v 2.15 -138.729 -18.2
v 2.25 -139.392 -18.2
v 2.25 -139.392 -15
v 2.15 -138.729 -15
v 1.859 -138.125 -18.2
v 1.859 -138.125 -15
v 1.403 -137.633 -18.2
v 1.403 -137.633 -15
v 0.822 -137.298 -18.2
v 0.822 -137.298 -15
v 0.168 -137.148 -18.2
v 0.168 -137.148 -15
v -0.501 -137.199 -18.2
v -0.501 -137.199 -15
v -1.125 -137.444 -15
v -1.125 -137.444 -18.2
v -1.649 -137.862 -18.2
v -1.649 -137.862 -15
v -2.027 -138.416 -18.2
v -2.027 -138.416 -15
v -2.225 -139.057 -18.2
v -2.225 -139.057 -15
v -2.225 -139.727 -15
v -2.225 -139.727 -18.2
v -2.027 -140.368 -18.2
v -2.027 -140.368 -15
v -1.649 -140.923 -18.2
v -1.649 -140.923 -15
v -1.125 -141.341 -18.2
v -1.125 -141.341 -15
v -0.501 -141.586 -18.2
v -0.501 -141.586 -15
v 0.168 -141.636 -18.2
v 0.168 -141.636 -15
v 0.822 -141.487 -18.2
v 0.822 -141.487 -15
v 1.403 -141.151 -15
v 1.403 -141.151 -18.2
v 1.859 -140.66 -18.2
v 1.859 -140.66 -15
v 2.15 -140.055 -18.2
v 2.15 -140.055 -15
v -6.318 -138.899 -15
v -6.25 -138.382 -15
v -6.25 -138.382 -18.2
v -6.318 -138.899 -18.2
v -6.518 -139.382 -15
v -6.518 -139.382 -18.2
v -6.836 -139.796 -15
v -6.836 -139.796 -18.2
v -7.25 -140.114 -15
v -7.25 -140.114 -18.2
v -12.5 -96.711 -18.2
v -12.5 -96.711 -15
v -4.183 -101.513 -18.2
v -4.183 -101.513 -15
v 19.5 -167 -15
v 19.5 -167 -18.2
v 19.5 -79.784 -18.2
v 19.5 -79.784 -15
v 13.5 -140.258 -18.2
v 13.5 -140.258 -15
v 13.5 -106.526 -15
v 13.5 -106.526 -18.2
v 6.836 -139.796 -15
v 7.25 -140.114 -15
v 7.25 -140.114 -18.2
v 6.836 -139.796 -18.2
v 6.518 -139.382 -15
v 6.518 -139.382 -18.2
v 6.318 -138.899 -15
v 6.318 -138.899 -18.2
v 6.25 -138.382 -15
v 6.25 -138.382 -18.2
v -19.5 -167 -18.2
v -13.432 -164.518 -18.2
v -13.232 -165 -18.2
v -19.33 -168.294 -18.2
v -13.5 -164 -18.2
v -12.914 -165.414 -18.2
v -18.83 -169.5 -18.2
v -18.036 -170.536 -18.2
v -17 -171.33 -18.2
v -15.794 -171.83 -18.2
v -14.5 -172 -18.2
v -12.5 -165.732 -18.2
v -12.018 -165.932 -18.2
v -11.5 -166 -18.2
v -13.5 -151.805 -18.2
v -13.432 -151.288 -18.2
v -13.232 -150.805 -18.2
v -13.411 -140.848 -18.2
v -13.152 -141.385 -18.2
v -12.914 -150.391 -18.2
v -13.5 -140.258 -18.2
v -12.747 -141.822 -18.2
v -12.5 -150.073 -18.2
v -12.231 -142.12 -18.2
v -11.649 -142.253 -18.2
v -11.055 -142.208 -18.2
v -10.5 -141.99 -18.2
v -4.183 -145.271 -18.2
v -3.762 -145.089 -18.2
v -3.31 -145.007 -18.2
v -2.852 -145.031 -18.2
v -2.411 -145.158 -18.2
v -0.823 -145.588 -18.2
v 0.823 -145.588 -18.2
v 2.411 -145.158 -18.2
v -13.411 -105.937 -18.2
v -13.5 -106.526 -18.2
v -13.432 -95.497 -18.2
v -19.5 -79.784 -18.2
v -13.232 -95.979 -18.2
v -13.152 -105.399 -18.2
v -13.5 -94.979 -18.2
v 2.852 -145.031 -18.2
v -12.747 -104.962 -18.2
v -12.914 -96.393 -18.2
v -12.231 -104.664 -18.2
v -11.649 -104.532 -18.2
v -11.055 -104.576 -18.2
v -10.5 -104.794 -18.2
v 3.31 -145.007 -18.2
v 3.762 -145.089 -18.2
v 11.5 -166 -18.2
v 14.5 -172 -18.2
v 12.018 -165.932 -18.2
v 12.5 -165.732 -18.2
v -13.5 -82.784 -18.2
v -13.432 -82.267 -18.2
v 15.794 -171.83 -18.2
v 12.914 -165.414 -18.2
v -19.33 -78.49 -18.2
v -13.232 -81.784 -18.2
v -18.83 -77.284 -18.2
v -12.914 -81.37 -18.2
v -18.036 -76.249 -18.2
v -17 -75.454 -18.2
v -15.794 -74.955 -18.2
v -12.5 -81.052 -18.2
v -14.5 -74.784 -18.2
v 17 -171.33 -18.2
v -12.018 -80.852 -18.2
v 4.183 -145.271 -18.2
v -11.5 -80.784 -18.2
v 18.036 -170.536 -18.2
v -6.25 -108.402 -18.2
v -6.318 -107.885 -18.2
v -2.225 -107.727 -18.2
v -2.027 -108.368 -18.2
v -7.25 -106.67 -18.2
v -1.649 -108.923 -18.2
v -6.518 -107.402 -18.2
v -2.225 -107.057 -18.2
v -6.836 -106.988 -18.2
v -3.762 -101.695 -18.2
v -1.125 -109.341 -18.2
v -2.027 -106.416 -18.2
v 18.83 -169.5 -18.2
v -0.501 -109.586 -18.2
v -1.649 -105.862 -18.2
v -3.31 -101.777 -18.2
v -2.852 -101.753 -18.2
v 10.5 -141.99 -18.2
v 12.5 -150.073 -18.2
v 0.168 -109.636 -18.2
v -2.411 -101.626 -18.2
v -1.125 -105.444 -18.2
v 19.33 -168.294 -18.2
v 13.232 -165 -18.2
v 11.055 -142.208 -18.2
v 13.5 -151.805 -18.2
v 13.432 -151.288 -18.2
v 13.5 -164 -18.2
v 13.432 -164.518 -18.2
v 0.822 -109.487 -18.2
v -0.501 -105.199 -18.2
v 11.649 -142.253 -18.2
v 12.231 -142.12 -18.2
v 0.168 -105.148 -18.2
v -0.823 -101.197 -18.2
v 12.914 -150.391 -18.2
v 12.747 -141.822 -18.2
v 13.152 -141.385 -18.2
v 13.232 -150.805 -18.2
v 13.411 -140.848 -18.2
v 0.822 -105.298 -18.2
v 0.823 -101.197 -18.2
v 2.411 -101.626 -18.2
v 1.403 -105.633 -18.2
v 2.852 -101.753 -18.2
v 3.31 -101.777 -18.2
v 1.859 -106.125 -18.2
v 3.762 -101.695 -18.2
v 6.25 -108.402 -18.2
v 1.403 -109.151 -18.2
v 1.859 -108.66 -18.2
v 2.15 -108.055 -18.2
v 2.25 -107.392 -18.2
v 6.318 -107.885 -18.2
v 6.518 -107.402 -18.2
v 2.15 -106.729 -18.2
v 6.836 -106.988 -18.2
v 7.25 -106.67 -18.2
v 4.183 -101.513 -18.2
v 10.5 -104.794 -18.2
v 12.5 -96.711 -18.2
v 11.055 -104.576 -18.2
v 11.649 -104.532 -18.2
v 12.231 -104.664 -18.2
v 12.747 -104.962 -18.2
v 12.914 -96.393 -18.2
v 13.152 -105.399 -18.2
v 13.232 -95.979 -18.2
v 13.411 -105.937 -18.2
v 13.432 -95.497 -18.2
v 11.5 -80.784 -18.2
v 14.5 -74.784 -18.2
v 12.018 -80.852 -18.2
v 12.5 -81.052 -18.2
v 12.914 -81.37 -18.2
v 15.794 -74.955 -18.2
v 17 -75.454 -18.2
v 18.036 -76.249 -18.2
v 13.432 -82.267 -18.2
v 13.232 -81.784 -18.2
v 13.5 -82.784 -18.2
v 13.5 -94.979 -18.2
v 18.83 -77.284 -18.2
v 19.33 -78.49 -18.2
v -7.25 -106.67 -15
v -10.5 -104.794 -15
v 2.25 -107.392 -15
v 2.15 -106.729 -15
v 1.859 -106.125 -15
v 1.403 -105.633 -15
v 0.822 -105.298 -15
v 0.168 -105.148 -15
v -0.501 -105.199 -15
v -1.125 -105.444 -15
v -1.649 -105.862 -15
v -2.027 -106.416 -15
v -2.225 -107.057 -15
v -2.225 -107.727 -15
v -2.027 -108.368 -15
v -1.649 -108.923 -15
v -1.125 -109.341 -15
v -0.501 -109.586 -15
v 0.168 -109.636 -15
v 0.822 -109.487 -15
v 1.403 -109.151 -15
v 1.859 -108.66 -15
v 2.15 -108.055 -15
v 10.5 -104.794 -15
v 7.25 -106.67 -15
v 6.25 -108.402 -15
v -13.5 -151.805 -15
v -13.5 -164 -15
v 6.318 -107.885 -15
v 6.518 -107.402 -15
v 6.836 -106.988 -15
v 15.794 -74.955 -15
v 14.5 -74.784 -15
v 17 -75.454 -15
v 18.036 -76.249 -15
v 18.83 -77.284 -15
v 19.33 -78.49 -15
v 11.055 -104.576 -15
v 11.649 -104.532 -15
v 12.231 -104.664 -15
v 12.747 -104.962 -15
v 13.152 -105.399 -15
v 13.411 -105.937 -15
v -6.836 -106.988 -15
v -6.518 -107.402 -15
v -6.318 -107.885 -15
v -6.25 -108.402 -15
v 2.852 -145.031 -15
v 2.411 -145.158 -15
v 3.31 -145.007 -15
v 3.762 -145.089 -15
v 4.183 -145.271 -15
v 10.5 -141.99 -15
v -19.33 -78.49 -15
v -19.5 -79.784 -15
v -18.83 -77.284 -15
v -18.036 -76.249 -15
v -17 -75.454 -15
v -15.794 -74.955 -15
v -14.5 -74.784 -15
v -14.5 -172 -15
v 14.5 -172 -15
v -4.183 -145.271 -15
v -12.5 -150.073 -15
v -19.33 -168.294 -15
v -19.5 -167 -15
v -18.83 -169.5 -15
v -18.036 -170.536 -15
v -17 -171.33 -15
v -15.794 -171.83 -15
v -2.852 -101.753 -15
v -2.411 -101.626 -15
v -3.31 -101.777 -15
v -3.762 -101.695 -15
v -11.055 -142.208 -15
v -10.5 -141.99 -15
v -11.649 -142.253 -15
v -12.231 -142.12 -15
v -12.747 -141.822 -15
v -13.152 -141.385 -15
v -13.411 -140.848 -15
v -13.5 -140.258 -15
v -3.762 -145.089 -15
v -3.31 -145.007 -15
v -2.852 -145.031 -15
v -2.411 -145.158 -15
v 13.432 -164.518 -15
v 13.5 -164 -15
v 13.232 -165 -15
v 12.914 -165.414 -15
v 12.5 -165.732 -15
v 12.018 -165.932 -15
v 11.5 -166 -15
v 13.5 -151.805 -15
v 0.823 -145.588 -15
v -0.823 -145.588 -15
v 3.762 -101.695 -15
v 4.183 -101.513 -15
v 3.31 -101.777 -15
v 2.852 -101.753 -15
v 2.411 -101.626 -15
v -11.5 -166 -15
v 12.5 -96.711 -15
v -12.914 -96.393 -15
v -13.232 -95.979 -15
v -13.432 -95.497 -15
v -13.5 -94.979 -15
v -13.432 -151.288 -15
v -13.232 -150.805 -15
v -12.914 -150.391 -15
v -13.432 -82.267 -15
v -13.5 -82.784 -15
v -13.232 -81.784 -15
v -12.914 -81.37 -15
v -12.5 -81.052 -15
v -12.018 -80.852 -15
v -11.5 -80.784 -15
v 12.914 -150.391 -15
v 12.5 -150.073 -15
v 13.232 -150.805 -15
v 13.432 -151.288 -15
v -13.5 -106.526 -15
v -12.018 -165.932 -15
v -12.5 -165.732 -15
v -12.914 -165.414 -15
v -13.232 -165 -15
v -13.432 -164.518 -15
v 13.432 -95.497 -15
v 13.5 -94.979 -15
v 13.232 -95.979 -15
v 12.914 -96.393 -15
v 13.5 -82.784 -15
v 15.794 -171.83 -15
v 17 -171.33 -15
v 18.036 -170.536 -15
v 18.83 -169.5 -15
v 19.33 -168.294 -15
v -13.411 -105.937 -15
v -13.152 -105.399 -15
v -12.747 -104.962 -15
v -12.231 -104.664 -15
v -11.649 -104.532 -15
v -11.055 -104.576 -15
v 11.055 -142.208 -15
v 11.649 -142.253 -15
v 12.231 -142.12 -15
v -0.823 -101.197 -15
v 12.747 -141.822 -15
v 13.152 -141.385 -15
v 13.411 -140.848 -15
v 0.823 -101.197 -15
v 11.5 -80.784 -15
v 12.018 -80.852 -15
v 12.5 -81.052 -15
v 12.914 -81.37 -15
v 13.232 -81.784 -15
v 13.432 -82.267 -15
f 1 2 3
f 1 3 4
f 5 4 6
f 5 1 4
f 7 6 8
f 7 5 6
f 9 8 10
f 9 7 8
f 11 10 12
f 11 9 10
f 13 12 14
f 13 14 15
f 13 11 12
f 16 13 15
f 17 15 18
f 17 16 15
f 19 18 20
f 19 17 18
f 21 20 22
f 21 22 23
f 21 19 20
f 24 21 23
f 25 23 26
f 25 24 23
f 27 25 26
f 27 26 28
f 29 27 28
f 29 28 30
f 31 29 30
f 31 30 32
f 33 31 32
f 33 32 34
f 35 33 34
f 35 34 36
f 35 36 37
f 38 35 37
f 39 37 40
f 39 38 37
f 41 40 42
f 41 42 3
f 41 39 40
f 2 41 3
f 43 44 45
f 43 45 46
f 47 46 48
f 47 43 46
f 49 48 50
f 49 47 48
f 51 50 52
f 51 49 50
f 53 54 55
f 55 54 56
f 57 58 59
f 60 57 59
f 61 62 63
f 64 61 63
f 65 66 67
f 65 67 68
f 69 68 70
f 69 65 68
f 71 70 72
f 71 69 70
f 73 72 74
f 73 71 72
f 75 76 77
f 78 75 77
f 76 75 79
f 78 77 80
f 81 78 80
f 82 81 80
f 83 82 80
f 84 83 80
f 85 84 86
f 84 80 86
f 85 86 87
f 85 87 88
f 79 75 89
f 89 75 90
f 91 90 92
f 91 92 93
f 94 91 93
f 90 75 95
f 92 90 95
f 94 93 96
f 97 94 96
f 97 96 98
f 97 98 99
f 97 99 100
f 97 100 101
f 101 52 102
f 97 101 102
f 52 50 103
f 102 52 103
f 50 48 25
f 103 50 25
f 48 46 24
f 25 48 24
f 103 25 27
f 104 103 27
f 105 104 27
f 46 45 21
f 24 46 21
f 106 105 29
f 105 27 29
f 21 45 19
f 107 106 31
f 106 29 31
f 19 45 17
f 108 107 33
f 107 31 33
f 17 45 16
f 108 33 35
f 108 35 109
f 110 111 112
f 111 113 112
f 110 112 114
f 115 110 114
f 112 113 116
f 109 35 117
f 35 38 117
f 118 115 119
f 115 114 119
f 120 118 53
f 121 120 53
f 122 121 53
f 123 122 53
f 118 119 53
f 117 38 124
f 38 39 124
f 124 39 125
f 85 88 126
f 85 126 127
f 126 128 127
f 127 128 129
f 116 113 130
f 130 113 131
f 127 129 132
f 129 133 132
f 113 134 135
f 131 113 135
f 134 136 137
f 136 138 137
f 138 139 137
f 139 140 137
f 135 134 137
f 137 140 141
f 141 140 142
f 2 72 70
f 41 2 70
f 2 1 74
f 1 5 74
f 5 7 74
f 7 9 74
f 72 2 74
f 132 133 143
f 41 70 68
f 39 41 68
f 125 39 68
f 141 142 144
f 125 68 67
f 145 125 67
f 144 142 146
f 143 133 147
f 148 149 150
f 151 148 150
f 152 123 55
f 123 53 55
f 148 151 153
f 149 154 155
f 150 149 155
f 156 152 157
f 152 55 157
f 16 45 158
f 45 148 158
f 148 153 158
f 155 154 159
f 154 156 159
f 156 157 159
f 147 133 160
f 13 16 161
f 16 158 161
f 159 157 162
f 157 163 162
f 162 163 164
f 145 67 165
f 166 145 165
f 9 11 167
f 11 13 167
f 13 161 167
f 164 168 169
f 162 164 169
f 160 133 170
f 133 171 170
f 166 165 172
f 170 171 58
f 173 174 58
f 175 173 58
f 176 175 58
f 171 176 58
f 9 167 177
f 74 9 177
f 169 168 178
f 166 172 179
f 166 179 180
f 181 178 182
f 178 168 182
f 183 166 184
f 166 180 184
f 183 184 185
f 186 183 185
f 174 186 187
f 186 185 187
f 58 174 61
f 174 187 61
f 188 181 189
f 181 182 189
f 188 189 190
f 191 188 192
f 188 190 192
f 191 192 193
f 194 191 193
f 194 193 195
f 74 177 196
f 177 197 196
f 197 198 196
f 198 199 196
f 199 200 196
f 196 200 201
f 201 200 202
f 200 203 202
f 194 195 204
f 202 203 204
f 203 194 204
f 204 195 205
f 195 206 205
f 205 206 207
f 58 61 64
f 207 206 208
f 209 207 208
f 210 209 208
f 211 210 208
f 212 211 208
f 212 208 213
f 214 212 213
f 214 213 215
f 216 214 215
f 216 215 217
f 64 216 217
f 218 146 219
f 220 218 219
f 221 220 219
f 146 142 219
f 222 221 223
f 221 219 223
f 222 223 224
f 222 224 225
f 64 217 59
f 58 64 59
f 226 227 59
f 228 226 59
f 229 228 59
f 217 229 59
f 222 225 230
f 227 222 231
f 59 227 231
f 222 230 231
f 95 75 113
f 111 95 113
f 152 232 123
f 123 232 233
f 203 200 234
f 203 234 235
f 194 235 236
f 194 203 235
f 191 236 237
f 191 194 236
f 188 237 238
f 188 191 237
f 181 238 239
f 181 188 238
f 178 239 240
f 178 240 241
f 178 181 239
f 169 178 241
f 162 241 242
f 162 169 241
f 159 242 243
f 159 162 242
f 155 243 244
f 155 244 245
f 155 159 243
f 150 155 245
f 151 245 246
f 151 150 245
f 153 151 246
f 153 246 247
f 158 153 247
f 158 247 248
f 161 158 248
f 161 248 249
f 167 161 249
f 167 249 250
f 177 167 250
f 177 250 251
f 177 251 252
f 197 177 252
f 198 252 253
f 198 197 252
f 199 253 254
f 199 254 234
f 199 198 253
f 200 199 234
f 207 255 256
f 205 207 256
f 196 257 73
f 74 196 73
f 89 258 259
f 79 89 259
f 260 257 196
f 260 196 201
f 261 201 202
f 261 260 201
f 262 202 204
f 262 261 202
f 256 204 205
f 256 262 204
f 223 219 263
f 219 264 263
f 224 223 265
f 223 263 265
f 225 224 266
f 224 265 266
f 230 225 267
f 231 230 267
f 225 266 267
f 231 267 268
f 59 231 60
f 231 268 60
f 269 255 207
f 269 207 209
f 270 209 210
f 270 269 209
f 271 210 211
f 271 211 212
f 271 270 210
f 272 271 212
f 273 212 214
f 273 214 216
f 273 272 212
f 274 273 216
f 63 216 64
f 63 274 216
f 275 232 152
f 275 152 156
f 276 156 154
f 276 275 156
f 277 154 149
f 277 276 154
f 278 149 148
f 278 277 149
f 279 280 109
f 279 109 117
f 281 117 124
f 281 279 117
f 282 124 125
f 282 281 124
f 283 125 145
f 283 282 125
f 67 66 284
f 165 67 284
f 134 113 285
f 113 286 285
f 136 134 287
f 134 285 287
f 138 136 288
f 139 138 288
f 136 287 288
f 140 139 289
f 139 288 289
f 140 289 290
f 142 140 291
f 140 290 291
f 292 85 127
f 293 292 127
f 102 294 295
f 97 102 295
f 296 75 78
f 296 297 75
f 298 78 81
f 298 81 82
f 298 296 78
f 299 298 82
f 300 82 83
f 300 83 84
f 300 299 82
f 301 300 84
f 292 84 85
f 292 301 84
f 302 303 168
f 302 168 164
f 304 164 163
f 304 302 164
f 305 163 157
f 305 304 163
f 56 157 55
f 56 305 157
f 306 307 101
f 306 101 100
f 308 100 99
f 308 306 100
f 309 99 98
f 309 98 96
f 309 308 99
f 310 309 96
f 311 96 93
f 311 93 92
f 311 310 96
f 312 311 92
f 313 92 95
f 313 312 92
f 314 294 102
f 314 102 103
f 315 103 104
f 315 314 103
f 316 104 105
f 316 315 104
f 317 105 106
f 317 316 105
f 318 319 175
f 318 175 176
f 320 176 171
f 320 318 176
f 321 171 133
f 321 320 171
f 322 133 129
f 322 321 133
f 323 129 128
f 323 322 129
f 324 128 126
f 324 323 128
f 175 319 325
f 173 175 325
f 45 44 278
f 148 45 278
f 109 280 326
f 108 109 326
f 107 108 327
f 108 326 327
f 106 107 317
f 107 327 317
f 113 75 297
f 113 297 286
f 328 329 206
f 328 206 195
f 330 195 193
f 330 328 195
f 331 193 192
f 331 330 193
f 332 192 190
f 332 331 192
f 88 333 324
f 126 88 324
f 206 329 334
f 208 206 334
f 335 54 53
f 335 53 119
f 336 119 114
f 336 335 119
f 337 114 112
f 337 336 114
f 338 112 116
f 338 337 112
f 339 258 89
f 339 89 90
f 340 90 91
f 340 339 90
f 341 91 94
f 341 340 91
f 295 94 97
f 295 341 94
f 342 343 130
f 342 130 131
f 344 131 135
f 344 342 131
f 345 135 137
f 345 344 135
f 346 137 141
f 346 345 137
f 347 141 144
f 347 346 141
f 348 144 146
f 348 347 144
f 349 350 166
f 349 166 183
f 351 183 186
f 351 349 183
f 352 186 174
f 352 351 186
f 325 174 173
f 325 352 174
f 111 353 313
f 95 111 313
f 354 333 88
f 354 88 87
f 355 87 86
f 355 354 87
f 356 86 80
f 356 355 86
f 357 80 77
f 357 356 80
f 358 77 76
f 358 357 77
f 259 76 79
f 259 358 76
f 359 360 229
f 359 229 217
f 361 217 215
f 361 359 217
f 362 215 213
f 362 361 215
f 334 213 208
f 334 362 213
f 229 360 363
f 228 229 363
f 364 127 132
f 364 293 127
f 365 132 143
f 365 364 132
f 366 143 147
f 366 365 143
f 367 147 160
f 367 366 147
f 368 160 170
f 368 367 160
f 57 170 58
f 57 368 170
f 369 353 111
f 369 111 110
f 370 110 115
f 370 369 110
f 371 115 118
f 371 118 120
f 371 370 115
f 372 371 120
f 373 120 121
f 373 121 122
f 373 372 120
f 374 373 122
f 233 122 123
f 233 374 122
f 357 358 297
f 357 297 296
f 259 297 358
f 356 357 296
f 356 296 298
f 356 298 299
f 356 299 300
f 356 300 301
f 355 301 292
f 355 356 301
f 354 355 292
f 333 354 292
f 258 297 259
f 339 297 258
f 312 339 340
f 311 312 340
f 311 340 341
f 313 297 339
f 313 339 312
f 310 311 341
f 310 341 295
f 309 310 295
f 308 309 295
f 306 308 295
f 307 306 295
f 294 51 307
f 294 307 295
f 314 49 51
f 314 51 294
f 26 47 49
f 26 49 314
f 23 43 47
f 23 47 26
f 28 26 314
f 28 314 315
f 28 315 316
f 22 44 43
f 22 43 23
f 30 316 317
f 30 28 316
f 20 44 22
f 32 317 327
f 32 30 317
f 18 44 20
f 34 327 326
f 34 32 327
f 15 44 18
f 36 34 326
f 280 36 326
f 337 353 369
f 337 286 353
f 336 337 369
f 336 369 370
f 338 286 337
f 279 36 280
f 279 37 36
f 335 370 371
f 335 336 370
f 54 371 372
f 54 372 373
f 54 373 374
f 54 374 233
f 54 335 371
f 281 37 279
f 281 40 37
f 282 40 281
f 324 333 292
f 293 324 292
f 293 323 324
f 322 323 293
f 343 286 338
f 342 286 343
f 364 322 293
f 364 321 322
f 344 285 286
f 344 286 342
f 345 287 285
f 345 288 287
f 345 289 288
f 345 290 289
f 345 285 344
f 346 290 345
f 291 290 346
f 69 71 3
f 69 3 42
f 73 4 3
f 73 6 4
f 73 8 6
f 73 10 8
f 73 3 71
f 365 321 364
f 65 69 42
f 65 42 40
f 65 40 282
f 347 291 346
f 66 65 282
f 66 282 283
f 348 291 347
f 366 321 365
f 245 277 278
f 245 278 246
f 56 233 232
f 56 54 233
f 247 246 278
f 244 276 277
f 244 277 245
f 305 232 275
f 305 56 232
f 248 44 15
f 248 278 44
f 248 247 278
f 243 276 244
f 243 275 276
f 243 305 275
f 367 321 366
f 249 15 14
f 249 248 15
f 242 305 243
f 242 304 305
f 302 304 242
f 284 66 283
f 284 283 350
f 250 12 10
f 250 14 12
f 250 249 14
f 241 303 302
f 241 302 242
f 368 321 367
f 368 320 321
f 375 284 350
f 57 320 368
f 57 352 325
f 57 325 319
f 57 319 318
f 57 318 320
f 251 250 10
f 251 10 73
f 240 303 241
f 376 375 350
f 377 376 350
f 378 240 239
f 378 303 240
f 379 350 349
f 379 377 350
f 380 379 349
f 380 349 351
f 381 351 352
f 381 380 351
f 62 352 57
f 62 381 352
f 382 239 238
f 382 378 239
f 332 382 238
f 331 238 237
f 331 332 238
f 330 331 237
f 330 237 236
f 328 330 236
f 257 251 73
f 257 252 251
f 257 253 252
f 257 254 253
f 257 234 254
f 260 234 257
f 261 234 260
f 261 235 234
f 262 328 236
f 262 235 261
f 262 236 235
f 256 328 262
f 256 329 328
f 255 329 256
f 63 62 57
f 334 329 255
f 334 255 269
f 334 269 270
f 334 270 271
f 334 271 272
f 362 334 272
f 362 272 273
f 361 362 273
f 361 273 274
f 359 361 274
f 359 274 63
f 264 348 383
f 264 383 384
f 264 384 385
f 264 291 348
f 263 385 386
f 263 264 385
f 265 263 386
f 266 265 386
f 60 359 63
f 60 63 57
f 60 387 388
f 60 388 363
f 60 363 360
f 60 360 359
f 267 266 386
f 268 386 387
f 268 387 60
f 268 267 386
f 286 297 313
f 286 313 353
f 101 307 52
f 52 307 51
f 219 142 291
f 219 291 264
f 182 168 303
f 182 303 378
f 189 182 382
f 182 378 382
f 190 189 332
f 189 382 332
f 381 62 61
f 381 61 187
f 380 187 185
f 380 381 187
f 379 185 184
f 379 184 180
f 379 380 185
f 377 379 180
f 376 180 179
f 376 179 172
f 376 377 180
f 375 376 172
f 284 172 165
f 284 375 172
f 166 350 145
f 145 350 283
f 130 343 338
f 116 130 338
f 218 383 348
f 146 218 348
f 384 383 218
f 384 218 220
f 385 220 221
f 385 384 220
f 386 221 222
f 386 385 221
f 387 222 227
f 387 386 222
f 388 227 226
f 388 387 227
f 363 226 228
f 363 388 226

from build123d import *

# Parameters (mm, degrees)
STOCK_SPINE_MASTER_1_START     = -18.2
STOCK_SPINE_MASTER_1_OUTLINE_W = 39
STOCK_SPINE_MASTER_1_OUTLINE_H = 97.215728753
STOCK_SPINE_MASTER_1_OUTLINE_R = 2.25
STOCK_SPINE_MASTER_1_DEPTH     = 3.2
FILLET2_R                      = 5
CUT_EXTRUDE1_DEPTH             = 174.131424069
FILLET5_R                      = 2


# Read off the part's stored shape, not the designer's step: Stock-spine_master-1
with BuildPart() as part:
    # Stock-spine_master-1 outline → Stock-spine_master-1 (new body)
    with BuildSketch(Plane.XY.offset(STOCK_SPINE_MASTER_1_START)):
        with Locations((0, -123.392135623)):
            Rectangle(STOCK_SPINE_MASTER_1_OUTLINE_W, STOCK_SPINE_MASTER_1_OUTLINE_H)
        with Locations((0, -139.392135624)):
            Circle(STOCK_SPINE_MASTER_1_OUTLINE_R, mode=Mode.SUBTRACT)
        with Locations((0, -107.392135624)):
            Circle(STOCK_SPINE_MASTER_1_OUTLINE_R, mode=Mode.SUBTRACT)
    extrude(amount=STOCK_SPINE_MASTER_1_DEPTH)

    # Fillet2
    fillet2_edges = [part.edges().sort_by_distance(p)[0] for p in [
        (19.5, -172, -16.6),
        (19.5, -74.784271247, -16.6),
        (-19.5, -74.784271247, -16.6),
        (-19.5, -172, -16.6),
    ]]
    fillet(fillet2_edges, radius=FILLET2_R)

    # Sketch1 → Cut-Extrude1 (cut, through all)
    with BuildSketch(Plane.XY.offset(-15)):
        with BuildLine():
            Line((-6.248354978, -107.24874781), (-13.5, -103.062008605))
            Line((-13.5, -103.062008605), (-13.5, -143.722262643))
            Line((-13.5, -143.722262643), (-6.248354978, -139.535523437))
            ThreePointArc((-6.248354978, -139.535523437), (-6.249588731, -139.463834249), (-6.25, -139.392135624))
            Line((-6.25, -139.392135624), (-6.25, -107.392135624))
            ThreePointArc((-6.25, -107.392135624), (-6.249588731, -107.320436999), (-6.248354978, -107.24874781))
        make_face()
        with BuildLine():
            Line((13.5, -80.784271247), (-13.5, -80.784271247))
            Line((-13.5, -80.784271247), (-13.5, -96.133805375))
            Line((-13.5, -96.133805375), (-3.248354978, -102.052595387))
            ThreePointArc((-3.248354978, -102.052595387), (0, -101.142135624), (3.248354978, -102.052595387))
            Line((3.248354978, -102.052595387), (13.5, -96.133805375))
            Line((13.5, -96.133805375), (13.5, -80.784271247))
        make_face()
        with BuildLine():
            Line((13.5, -143.722262643), (13.5, -103.062008605))
            Line((13.5, -103.062008605), (6.248354978, -107.24874781))
            ThreePointArc((6.248354978, -107.24874781), (6.249588731, -107.320436999), (6.25, -107.392135624))
            Line((6.25, -107.392135624), (6.25, -139.392135624))
            ThreePointArc((6.25, -139.392135624), (6.249588731, -139.463834249), (6.248354978, -139.535523437))
            Line((6.248354978, -139.535523437), (13.5, -143.722262643))
        make_face()
        with BuildLine():
            Line((-3.248354978, -144.73167586), (-13.5, -150.650465873))
            Line((-13.5, -150.650465873), (-13.5, -166))
            Line((-13.5, -166), (13.5, -166))
            Line((13.5, -166), (13.5, -150.650465873))
            Line((13.5, -150.650465873), (3.248354978, -144.73167586))
            ThreePointArc((3.248354978, -144.73167586), (0, -145.642135624), (-3.248354978, -144.73167586))
        make_face()
    extrude(amount=-CUT_EXTRUDE1_DEPTH, mode=Mode.SUBTRACT)

    # Fillet5
    # the kernel refuses this fillet: 2 mm, written as the material it adds along each edge
    with BuildSketch(Plane(origin=(-6.248354978, -107.24874781, -15), x_dir=(-0.8660254037844632, 0.4999999999999575, 0), z_dir=(0, 0, -1)), Plane(origin=(6.248354978, -139.535523437, -15), x_dir=(0.8660254037844526, -0.4999999999999759, 0), z_dir=(0, 0, -1))) as fillet5_piece_1:
        with BuildLine():
            CenterArc((1.156600046, -2), FILLET5_R, 90, 60)
            Line((-0.575450762, -1), (-0.748655843, -0.9))
            ThreePointArc((-0.748655843, -0.9), (-0.243474357, -0.025), (-0.175453698, 0.096))
            Line((-0.175453698, 0.096), (0, 0.2))
            Line((0, 0.2), (1.156600046, 0.2))
            Line((1.156600046, 0.2), (1.156600046, 0))
        make_face()
    extrude(amount=3.2)
    with BuildSketch(Plane(origin=(6.248354978, -107.24874781, -15), x_dir=(0.8660254037844632, 0.4999999999999575, 0), z_dir=(0, 0, -1)), Plane(origin=(-6.248354978, -139.535523437, -15), x_dir=(-0.8660254037844523, -0.4999999999999766, 0), z_dir=(0, 0, -1))) as fillet5_piece_2:
        with BuildLine():
            CenterArc((1.156600046, 2), FILLET5_R, 210, 60)
            Line((-0.575450762, 1), (-0.748655843, 0.9))
            ThreePointArc((-0.748655843, 0.9), (-0.243474357, 0.025), (-0.175453698, -0.096))
            Line((-0.175453698, -0.096), (0, -0.2))
            Line((0, -0.2), (1.156600046, -0.2))
            Line((1.156600046, -0.2), (1.156600046, 0))
        make_face()
    extrude(amount=3.2)
    with BuildSketch(Plane(origin=(-13.5, -166, -15), x_dir=(0, 1, 0), z_dir=(0, 0, -1)), Plane(origin=(13.5, -166, -15), x_dir=(-1, 0, 0), z_dir=(0, 0, -1)), Plane(origin=(-13.5, -80.784271247, -15), x_dir=(1, 0, 0), z_dir=(0, 0, -1))) as fillet5_piece_3:
        with BuildLine():
            CenterArc((FILLET5_R, FILLET5_R), FILLET5_R, 180, 90)
            Line((0, FILLET5_R), (0, 0))
            Line((0, 0), (FILLET5_R, 0))
        make_face()
    extrude(amount=3.2)
    with BuildSketch(Plane(origin=(13.5, -150.650465873, -15), x_dir=(0, -1, 0), z_dir=(0, 0, -1)), Plane(origin=(13.5, -96.133805375, -15), x_dir=(-0.8660254037844395, -0.49999999999999867, 0), z_dir=(0, 0, -1)), Plane(origin=(-13.5, -96.133805375, -15), x_dir=(0, 1, 0), z_dir=(0, 0, -1)), Plane(origin=(-13.5, -150.650465873, -15), x_dir=(0.8660254037844375, 0.5000000000000019, 0), z_dir=(0, 0, -1))) as fillet5_piece_4:
        with BuildLine():
            CenterArc((FILLET5_R * 0.57735026919, FILLET5_R), FILLET5_R, 210, 60)
            Line((-FILLET5_R * 0.288675134595, FILLET5_R * 0.5), (0, 0))
            Line((0, 0), (FILLET5_R * 0.57735026919, 0))
        make_face()
    extrude(amount=3.2)
    with BuildSketch(Plane(origin=(13.5, -143.722262643, -15), x_dir=(-0.8660254037844394, 0.4999999999999986, 0), z_dir=(0, 0, -1)), Plane(origin=(13.5, -103.062008605, -15), x_dir=(0, -1, 0), z_dir=(0, 0, -1)), Plane(origin=(-13.5, -103.062008605, -15), x_dir=(0.866025403784438, -0.500000000000001, 0), z_dir=(0, 0, -1)), Plane(origin=(-13.5, -143.722262643, -15), x_dir=(0, 1, 0), z_dir=(0, 0, -1))) as fillet5_piece_5:
        with BuildLine():
            CenterArc((FILLET5_R * 1.73205080757, FILLET5_R), FILLET5_R, 150, 120)
            Line((FILLET5_R * 0.866025403784, FILLET5_R * 1.5), (0, 0))
            Line((0, 0), (FILLET5_R * 1.73205080757, 0))
        make_face()
    extrude(amount=3.2)
    with BuildSketch(Plane(origin=(13.5, -80.784271247, -15), x_dir=(-1, 0, 0), z_dir=(0, 0, -1))) as fillet5_piece_6:
        with BuildLine():
            CenterArc((FILLET5_R, -FILLET5_R), FILLET5_R, 90, 90)
            Line((0, -FILLET5_R), (0, 0))
            Line((0, 0), (FILLET5_R, 0))
        make_face()
    extrude(amount=3.2)
    with BuildSketch(Plane(origin=(3.248354978, -144.73167586, -15), x_dir=(0.866025403784452, -0.49999999999997674, 0), z_dir=(0, 0, -1)), Plane(origin=(-3.248354978, -102.052595387, -15), x_dir=(-0.8660254037844742, 0.4999999999999385, 0), z_dir=(0, 0, -1))) as fillet5_piece_7:
        with BuildLine():
            CenterArc((1.079274324, 2), FILLET5_R, 217.305200966, 52.694799034)
            ThreePointArc((-0.511562615, 0.787878788), (-0.240957875, 0.403564115), (0, 0))
            Line((0, 0), (1.079274324, 0))
        make_face()
    extrude(amount=3.2)
    with BuildSketch(Plane(origin=(-3.248354978, -144.73167586, -15), x_dir=(-0.8660254037844329, -0.5000000000000099, 0), z_dir=(0, 0, -1))) as fillet5_piece_8:
        with BuildLine():
            CenterArc((1.079274324, -2), FILLET5_R, 90, 52.694799034)
            ThreePointArc((-0.511562615, -0.787878788), (-0.240957875, -0.403564115), (0, 0))
            Line((0, 0), (1.079274324, 0))
        make_face()
    extrude(amount=3.2)
    with BuildSketch(Plane(origin=(3.248354978, -102.052595387, -15), x_dir=(-0.8909692919420457, 0.4540635647310734, 0), z_dir=(0, 0, -1))) as fillet5_piece_9:
        with BuildLine():
            CenterArc((1.089689758, 1.994344328), FILLET5_R, 212.99530149, 52.694799034)
            Line((-0.587740698, 0.905203811), (0, 0))
            ThreePointArc((0, 0), (0.469693861, 0.017673975), (0.939387723, 0))
        make_face()
    extrude(amount=3.2)


solid = part.part
